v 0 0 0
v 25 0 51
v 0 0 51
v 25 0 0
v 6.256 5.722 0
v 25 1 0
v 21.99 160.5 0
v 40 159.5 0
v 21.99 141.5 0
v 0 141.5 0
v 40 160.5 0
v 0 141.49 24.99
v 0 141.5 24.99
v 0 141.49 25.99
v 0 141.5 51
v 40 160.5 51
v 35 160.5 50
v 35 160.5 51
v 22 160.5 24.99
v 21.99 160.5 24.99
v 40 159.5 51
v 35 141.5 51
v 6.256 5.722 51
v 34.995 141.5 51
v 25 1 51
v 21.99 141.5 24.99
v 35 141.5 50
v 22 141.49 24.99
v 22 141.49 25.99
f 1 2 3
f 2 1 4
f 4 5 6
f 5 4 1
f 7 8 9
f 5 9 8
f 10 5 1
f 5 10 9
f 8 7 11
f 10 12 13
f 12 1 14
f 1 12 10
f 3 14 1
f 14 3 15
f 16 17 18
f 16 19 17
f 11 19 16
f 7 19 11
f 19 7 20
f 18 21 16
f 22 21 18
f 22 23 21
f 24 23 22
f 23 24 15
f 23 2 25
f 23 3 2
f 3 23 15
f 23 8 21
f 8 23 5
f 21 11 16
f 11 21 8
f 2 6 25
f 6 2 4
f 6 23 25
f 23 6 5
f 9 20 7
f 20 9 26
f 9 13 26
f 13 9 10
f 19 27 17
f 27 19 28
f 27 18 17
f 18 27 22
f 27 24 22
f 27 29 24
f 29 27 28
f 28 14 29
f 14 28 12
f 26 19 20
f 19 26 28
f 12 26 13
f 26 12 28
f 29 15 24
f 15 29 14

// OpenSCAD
batteryCompartmentWidth=51;
batteryCompartmentLength=141.5;
batteryCompartmentLedgeHeightInner=35;
batteryCompartmentLedgeHeightOuter=22;
batteryCompartmentLedgeWidthOuter=25;

wedgeOverhang=19;
wedgeLength=batteryCompartmentLength+wedgeOverhang;
wedgeLowEndHeight=5;
wedgeHighEndHeight=40;

footHeight=20;

footTopHeight=wedgeLowEndHeight+footHeight;

wedgeAngle=atan(wedgeHighEndHeight/wedgeLength);

footBottomLength=sin(wedgeAngle)*footTopHeight;

overlap=0.01;
$fn=50;

rotate([90,0,90])
difference() {
    union() {
        hull() {
            cube([1,1,wedgeLowEndHeight]);
            translate([wedgeLength-1,0,0])
                cube([1,1,wedgeHighEndHeight]);
            translate([0,batteryCompartmentWidth-1,0])
                cube([1,1,wedgeLowEndHeight]);
            translate([wedgeLength-1,batteryCompartmentWidth-1,0])
                cube([1,1,wedgeHighEndHeight]);
        }
        hull() {
            cube([1,batteryCompartmentWidth,footTopHeight]);
            translate([footBottomLength,0,0])
                cube([1,batteryCompartmentWidth,1]);
        }
    }
    // cut out shape under ledge
    translate([batteryCompartmentLength,-overlap,-overlap]) {
        union() {
            cube([wedgeOverhang+overlap, batteryCompartmentWidth, batteryCompartmentLedgeHeightOuter]);
            hull() {
                // 1x1 posts in the middle, where the slope goes up
                translate([-overlap,batteryCompartmentLedgeWidthOuter,-overlap]) // +y-axis low/outer height
                    cube([1,1,batteryCompartmentLedgeHeightOuter+overlap*2]);
                translate([wedgeOverhang-1+overlap,batteryCompartmentLedgeWidthOuter,-overlap]) // +x-axis and +y-axis low/outer height
                    cube([1+overlap,1+overlap,batteryCompartmentLedgeHeightOuter+overlap*2]);
                // 1x1 posts at the high corners    
                translate([0,batteryCompartmentWidth-1+overlap,-overlap]) // +y-axis
                    cube([1+overlap,1+overlap,batteryCompartmentLedgeHeightInner+overlap*2]);
                translate([wedgeOverhang-1+overlap,batteryCompartmentWidth-1+overlap,-overlap]) // + both
                    cube([1+overlap,1+overlap,batteryCompartmentLedgeHeightInner+overlap*2]);
            }
        }
    }
}
